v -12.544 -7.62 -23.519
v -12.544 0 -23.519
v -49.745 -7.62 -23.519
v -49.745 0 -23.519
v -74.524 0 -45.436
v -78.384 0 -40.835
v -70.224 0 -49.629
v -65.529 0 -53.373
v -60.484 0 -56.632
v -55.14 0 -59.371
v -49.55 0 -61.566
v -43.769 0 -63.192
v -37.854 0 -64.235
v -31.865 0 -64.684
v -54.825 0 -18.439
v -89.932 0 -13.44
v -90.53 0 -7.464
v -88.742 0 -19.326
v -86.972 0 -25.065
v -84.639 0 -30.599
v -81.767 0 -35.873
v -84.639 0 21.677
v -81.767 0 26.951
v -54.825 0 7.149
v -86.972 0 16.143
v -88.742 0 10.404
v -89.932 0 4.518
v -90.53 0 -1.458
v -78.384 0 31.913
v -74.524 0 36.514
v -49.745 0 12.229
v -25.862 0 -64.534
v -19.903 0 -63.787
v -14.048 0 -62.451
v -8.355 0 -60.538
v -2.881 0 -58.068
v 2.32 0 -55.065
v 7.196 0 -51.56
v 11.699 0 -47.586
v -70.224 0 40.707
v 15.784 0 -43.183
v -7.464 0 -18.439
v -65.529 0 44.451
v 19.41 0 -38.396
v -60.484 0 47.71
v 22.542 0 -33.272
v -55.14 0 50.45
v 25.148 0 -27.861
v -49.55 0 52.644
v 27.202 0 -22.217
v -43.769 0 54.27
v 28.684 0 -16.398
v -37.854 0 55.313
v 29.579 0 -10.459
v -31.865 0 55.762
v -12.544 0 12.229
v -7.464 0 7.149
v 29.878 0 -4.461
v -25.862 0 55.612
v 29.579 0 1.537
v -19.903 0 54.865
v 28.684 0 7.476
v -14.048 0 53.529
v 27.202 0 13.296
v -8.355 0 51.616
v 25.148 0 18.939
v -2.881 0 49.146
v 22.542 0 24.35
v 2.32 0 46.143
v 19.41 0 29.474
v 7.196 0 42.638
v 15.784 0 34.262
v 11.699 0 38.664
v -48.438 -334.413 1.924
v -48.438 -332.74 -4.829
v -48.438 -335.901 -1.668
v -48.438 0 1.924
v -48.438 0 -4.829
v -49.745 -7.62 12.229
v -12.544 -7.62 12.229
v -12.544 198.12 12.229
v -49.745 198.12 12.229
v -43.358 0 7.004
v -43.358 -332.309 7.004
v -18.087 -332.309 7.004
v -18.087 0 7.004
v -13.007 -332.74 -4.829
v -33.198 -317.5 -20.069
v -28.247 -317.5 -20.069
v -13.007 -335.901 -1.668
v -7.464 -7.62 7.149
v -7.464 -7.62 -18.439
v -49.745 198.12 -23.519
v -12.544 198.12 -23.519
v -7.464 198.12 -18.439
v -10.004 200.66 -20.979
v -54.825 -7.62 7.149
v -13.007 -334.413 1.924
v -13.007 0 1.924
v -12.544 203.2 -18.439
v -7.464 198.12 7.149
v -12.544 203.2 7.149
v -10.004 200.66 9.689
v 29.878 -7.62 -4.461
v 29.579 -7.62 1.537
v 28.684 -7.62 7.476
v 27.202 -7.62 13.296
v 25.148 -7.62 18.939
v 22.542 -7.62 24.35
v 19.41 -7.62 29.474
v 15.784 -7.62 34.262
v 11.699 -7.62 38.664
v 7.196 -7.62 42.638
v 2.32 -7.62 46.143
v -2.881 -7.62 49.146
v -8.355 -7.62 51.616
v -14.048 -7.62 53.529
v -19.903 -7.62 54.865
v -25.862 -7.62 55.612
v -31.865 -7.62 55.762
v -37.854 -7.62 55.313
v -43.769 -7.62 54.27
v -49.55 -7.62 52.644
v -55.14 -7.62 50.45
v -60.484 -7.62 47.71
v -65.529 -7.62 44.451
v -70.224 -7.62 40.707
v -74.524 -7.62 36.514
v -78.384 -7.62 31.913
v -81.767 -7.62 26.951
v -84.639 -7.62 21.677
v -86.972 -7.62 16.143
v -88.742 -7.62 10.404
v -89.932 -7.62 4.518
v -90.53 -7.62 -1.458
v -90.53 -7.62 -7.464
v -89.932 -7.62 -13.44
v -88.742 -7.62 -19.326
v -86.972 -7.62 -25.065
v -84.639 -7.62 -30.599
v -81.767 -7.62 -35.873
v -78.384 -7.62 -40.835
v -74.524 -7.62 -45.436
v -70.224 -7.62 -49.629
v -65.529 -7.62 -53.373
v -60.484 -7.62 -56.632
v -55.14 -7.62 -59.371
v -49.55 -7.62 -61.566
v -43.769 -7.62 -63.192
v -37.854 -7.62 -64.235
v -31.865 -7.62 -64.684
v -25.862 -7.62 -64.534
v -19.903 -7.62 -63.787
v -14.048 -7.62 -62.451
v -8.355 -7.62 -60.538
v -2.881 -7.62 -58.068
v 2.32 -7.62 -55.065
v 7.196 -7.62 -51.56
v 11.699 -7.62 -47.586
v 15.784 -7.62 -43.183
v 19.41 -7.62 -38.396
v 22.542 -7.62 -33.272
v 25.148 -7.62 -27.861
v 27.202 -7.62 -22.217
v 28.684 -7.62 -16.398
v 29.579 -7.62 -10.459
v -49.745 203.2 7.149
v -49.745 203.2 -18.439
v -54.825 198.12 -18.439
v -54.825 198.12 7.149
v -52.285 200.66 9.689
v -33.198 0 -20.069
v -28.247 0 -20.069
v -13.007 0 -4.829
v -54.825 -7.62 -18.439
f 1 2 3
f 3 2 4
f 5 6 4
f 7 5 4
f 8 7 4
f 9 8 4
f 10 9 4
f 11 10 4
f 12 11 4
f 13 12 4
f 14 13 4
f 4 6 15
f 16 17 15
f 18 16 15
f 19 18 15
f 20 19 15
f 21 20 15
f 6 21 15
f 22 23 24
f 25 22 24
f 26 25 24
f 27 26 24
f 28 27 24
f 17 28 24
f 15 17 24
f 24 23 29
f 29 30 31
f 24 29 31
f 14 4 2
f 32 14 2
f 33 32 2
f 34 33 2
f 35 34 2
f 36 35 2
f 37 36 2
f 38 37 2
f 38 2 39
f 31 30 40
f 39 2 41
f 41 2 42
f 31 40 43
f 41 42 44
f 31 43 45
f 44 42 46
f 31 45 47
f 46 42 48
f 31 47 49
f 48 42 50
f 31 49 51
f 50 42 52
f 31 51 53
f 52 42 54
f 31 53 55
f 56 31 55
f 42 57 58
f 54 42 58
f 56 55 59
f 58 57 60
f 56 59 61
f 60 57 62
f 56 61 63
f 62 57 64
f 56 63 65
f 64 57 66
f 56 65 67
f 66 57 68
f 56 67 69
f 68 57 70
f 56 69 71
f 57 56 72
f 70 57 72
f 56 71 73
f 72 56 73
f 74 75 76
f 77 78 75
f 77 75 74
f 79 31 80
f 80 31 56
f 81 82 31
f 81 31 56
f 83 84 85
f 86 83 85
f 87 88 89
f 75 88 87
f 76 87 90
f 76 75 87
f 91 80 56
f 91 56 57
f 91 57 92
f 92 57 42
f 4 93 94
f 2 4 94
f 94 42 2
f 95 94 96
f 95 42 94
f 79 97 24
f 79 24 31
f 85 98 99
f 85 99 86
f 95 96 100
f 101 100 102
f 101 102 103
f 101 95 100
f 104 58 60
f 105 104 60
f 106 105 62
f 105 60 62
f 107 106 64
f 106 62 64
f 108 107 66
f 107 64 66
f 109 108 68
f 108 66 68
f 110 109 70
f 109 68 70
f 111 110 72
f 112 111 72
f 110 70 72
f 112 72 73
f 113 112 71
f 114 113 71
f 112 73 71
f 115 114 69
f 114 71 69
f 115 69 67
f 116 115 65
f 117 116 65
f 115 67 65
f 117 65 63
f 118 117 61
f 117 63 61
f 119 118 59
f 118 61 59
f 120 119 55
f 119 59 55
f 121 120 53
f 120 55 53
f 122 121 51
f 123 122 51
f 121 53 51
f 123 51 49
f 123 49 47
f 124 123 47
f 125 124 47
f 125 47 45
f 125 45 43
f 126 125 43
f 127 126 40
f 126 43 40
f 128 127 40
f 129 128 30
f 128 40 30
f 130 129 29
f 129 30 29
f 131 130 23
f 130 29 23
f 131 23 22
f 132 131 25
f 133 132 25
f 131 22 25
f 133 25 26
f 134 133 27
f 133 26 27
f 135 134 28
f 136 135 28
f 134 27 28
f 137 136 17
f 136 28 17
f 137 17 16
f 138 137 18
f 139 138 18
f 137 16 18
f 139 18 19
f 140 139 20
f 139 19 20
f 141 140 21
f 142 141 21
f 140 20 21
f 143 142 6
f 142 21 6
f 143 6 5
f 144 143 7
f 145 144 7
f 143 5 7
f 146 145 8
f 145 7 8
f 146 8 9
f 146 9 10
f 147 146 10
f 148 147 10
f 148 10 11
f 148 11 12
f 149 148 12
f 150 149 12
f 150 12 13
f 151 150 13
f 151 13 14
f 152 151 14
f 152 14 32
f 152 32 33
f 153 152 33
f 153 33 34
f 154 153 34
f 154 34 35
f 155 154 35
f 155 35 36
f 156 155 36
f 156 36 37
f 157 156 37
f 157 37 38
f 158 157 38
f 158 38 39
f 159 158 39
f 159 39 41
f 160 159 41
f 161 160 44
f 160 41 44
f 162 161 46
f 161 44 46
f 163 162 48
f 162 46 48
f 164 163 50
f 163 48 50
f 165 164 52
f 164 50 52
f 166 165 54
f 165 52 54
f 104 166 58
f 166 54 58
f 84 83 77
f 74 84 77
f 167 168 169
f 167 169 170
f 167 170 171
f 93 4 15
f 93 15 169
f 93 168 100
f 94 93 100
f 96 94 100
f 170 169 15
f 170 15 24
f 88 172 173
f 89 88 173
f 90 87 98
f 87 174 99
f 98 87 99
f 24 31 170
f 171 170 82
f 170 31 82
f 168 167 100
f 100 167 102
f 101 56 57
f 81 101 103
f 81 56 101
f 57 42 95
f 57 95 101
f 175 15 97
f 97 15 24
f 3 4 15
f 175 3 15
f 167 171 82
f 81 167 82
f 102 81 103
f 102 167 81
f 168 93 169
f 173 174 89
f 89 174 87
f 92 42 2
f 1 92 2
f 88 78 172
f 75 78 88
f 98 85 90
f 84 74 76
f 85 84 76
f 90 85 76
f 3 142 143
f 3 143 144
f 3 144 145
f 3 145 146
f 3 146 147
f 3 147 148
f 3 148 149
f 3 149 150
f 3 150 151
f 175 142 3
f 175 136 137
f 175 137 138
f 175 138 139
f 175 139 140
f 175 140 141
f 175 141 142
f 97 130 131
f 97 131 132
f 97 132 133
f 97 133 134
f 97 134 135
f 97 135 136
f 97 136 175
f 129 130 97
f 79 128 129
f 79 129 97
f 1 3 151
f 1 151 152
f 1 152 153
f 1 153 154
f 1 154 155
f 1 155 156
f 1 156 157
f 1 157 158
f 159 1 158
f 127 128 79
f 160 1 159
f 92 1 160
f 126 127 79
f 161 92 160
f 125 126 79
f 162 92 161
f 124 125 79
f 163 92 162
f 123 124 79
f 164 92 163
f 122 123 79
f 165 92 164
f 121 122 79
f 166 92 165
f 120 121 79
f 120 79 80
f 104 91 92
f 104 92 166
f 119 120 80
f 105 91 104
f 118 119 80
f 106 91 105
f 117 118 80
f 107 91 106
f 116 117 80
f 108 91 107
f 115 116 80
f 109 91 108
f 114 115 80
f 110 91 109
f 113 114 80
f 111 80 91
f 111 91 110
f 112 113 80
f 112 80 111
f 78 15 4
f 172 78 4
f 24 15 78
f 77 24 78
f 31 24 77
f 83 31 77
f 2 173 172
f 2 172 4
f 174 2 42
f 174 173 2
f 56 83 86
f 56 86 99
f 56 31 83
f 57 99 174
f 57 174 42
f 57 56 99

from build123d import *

# Parameters (mm, degrees)
F0_W         = 47.3607815802
F0_H         = 35.7480701059
F1_DEPTH     = 203.2
F2_SIZE      = 5.08
F3_SIZE      = 5.08
F4_R         = 60.2415289401
F5_DEPTH     = 7.62
F6_W         = 35.4304444045
F6_H         = 27.0730024204
F7_DEPTH     = 355.6
F8_SIZE      = 15.24
F9_T1_DEPTH  = 200.9126880875
F10_T1_DEPTH = 357.6371519992
F10_T3_DEPTH = 97.1474137836


# Not quite as in the source:
# - a fillet or chamfer that OpenCascade refuses, or shapes differently, is made with other operations: its cross-section is extruded or revolved along the edge and cut away or added


with BuildPart() as f1:
    # F0 (on Front) → F1 (new body)
    with BuildSketch(Plane.XZ):
        with Locations((-31.144855544, -5.644608289)):
            Rectangle(F0_W, F0_H)
    extrude(amount=-F1_DEPTH)

    # F2
    f2_edges = [f1.edges().sort_by_distance(p)[0] for p in [
        (-7.464465, 101.6, 12.229427),
        (-54.825246, 101.6, 12.229427),
        (-7.464465, 101.6, -23.518643),
    ]]
    chamfer(f2_edges, length=F2_SIZE)

    # F3 (call 1 of 3: OpenCascade refuses the feature's edges together)
    f3_edges = [f1.edges().sort_by_distance(p)[0] for p in [
        (-54.825246, 101.6, -23.518643),
        (-33.684856, 203.2, -23.518643),
        (-54.825246, 203.2, -8.184608),
    ]]
    chamfer(f3_edges, length=F3_SIZE)

    # F3#2 (call 2 of 3)
    f3_2_edges = [f1.edges().sort_by_distance(p)[0] for p in [
        (-31.144856, 203.2, 12.229427),
    ]]
    chamfer(f3_2_edges, length=F3_SIZE)

    # F3#3 (call 3 of 3)
    f3_3_edges = [f1.edges().sort_by_distance(p)[0] for p in [
        (-7.464465, 203.2, -5.644608),
    ]]
    chamfer(f3_3_edges, length=F3_SIZE)

    # F6 (on face) → F7 (join)
    with BuildSketch(Plane.XZ):
        with Locations((-30.7223126292, -6.5321633592)):
            Rectangle(F6_W, F6_H)
    extrude(amount=F7_DEPTH)

    # F8
    f8_edges = [f1.edges().sort_by_distance(p)[0] for p in [
        (-48.437535, -177.8, -20.068665),
        (-13.00709, -177.8, -20.068665),
    ]]
    chamfer(f8_edges, length=F8_SIZE)

    # F9: chamfer of 38.1 on 1 edges, made by hand

    # F9_s2 → F9_t1 (cut)
    with BuildSketch(Plane.YZ.offset(-131.178656673)):
        Polygon((-317.5, -20.0686645694), (-355.6, 18.0313354306), (-355.6, -20.0686645694), align=None)
    extrude(amount=F9_T1_DEPTH, mode=Mode.SUBTRACT)

    # F10: chamfer of 5.08 on 3 edges, made by hand

    # F10_s2 → F10_t1 (cut)
    with BuildSketch(Plane.XZ):
        Polygon((-43.3575348315, 7.004337851), (-48.4375348315, 1.924337851), (-48.4375348315, 7.004337851), align=None)
        Polygon((-13.007090427, 1.924337851), (-18.087090427, 7.004337851), (-13.007090427, 7.004337851), align=None)
    extrude(amount=F10_T1_DEPTH, mode=Mode.SUBTRACT)

    # F10_s4 → F10_t3 (cut)
    with BuildSketch(Plane.YZ.offset(-79.296019521)):
        Polygon((-332.3087975235, 7.004337851), (-335.9008999719, -1.6677645975), (-344.5730024204, 7.004337851), align=None)
    extrude(amount=F10_T3_DEPTH, mode=Mode.SUBTRACT)


with BuildPart() as f5:
    # F4 (on face) → F5 (new body)
    with BuildSketch(Plane.XZ):
        with Locations((-30.3635057062, -4.4609890319)):
            Circle(F4_R)
        Polygon((-54.8252463341, -18.438643342), (-54.8252463341, 7.149426764), (-49.7452463341, 12.229426764), (-12.5444647539, 12.229426764), (-7.4644647539, 7.149426764), (-7.4644647539, -18.438643342), (-12.5444647539, -23.518643342), (-49.7452463341, -23.518643342), align=None, mode=Mode.SUBTRACT)
    extrude(amount=F5_DEPTH)


solid = Compound([f1.part, f5.part])
